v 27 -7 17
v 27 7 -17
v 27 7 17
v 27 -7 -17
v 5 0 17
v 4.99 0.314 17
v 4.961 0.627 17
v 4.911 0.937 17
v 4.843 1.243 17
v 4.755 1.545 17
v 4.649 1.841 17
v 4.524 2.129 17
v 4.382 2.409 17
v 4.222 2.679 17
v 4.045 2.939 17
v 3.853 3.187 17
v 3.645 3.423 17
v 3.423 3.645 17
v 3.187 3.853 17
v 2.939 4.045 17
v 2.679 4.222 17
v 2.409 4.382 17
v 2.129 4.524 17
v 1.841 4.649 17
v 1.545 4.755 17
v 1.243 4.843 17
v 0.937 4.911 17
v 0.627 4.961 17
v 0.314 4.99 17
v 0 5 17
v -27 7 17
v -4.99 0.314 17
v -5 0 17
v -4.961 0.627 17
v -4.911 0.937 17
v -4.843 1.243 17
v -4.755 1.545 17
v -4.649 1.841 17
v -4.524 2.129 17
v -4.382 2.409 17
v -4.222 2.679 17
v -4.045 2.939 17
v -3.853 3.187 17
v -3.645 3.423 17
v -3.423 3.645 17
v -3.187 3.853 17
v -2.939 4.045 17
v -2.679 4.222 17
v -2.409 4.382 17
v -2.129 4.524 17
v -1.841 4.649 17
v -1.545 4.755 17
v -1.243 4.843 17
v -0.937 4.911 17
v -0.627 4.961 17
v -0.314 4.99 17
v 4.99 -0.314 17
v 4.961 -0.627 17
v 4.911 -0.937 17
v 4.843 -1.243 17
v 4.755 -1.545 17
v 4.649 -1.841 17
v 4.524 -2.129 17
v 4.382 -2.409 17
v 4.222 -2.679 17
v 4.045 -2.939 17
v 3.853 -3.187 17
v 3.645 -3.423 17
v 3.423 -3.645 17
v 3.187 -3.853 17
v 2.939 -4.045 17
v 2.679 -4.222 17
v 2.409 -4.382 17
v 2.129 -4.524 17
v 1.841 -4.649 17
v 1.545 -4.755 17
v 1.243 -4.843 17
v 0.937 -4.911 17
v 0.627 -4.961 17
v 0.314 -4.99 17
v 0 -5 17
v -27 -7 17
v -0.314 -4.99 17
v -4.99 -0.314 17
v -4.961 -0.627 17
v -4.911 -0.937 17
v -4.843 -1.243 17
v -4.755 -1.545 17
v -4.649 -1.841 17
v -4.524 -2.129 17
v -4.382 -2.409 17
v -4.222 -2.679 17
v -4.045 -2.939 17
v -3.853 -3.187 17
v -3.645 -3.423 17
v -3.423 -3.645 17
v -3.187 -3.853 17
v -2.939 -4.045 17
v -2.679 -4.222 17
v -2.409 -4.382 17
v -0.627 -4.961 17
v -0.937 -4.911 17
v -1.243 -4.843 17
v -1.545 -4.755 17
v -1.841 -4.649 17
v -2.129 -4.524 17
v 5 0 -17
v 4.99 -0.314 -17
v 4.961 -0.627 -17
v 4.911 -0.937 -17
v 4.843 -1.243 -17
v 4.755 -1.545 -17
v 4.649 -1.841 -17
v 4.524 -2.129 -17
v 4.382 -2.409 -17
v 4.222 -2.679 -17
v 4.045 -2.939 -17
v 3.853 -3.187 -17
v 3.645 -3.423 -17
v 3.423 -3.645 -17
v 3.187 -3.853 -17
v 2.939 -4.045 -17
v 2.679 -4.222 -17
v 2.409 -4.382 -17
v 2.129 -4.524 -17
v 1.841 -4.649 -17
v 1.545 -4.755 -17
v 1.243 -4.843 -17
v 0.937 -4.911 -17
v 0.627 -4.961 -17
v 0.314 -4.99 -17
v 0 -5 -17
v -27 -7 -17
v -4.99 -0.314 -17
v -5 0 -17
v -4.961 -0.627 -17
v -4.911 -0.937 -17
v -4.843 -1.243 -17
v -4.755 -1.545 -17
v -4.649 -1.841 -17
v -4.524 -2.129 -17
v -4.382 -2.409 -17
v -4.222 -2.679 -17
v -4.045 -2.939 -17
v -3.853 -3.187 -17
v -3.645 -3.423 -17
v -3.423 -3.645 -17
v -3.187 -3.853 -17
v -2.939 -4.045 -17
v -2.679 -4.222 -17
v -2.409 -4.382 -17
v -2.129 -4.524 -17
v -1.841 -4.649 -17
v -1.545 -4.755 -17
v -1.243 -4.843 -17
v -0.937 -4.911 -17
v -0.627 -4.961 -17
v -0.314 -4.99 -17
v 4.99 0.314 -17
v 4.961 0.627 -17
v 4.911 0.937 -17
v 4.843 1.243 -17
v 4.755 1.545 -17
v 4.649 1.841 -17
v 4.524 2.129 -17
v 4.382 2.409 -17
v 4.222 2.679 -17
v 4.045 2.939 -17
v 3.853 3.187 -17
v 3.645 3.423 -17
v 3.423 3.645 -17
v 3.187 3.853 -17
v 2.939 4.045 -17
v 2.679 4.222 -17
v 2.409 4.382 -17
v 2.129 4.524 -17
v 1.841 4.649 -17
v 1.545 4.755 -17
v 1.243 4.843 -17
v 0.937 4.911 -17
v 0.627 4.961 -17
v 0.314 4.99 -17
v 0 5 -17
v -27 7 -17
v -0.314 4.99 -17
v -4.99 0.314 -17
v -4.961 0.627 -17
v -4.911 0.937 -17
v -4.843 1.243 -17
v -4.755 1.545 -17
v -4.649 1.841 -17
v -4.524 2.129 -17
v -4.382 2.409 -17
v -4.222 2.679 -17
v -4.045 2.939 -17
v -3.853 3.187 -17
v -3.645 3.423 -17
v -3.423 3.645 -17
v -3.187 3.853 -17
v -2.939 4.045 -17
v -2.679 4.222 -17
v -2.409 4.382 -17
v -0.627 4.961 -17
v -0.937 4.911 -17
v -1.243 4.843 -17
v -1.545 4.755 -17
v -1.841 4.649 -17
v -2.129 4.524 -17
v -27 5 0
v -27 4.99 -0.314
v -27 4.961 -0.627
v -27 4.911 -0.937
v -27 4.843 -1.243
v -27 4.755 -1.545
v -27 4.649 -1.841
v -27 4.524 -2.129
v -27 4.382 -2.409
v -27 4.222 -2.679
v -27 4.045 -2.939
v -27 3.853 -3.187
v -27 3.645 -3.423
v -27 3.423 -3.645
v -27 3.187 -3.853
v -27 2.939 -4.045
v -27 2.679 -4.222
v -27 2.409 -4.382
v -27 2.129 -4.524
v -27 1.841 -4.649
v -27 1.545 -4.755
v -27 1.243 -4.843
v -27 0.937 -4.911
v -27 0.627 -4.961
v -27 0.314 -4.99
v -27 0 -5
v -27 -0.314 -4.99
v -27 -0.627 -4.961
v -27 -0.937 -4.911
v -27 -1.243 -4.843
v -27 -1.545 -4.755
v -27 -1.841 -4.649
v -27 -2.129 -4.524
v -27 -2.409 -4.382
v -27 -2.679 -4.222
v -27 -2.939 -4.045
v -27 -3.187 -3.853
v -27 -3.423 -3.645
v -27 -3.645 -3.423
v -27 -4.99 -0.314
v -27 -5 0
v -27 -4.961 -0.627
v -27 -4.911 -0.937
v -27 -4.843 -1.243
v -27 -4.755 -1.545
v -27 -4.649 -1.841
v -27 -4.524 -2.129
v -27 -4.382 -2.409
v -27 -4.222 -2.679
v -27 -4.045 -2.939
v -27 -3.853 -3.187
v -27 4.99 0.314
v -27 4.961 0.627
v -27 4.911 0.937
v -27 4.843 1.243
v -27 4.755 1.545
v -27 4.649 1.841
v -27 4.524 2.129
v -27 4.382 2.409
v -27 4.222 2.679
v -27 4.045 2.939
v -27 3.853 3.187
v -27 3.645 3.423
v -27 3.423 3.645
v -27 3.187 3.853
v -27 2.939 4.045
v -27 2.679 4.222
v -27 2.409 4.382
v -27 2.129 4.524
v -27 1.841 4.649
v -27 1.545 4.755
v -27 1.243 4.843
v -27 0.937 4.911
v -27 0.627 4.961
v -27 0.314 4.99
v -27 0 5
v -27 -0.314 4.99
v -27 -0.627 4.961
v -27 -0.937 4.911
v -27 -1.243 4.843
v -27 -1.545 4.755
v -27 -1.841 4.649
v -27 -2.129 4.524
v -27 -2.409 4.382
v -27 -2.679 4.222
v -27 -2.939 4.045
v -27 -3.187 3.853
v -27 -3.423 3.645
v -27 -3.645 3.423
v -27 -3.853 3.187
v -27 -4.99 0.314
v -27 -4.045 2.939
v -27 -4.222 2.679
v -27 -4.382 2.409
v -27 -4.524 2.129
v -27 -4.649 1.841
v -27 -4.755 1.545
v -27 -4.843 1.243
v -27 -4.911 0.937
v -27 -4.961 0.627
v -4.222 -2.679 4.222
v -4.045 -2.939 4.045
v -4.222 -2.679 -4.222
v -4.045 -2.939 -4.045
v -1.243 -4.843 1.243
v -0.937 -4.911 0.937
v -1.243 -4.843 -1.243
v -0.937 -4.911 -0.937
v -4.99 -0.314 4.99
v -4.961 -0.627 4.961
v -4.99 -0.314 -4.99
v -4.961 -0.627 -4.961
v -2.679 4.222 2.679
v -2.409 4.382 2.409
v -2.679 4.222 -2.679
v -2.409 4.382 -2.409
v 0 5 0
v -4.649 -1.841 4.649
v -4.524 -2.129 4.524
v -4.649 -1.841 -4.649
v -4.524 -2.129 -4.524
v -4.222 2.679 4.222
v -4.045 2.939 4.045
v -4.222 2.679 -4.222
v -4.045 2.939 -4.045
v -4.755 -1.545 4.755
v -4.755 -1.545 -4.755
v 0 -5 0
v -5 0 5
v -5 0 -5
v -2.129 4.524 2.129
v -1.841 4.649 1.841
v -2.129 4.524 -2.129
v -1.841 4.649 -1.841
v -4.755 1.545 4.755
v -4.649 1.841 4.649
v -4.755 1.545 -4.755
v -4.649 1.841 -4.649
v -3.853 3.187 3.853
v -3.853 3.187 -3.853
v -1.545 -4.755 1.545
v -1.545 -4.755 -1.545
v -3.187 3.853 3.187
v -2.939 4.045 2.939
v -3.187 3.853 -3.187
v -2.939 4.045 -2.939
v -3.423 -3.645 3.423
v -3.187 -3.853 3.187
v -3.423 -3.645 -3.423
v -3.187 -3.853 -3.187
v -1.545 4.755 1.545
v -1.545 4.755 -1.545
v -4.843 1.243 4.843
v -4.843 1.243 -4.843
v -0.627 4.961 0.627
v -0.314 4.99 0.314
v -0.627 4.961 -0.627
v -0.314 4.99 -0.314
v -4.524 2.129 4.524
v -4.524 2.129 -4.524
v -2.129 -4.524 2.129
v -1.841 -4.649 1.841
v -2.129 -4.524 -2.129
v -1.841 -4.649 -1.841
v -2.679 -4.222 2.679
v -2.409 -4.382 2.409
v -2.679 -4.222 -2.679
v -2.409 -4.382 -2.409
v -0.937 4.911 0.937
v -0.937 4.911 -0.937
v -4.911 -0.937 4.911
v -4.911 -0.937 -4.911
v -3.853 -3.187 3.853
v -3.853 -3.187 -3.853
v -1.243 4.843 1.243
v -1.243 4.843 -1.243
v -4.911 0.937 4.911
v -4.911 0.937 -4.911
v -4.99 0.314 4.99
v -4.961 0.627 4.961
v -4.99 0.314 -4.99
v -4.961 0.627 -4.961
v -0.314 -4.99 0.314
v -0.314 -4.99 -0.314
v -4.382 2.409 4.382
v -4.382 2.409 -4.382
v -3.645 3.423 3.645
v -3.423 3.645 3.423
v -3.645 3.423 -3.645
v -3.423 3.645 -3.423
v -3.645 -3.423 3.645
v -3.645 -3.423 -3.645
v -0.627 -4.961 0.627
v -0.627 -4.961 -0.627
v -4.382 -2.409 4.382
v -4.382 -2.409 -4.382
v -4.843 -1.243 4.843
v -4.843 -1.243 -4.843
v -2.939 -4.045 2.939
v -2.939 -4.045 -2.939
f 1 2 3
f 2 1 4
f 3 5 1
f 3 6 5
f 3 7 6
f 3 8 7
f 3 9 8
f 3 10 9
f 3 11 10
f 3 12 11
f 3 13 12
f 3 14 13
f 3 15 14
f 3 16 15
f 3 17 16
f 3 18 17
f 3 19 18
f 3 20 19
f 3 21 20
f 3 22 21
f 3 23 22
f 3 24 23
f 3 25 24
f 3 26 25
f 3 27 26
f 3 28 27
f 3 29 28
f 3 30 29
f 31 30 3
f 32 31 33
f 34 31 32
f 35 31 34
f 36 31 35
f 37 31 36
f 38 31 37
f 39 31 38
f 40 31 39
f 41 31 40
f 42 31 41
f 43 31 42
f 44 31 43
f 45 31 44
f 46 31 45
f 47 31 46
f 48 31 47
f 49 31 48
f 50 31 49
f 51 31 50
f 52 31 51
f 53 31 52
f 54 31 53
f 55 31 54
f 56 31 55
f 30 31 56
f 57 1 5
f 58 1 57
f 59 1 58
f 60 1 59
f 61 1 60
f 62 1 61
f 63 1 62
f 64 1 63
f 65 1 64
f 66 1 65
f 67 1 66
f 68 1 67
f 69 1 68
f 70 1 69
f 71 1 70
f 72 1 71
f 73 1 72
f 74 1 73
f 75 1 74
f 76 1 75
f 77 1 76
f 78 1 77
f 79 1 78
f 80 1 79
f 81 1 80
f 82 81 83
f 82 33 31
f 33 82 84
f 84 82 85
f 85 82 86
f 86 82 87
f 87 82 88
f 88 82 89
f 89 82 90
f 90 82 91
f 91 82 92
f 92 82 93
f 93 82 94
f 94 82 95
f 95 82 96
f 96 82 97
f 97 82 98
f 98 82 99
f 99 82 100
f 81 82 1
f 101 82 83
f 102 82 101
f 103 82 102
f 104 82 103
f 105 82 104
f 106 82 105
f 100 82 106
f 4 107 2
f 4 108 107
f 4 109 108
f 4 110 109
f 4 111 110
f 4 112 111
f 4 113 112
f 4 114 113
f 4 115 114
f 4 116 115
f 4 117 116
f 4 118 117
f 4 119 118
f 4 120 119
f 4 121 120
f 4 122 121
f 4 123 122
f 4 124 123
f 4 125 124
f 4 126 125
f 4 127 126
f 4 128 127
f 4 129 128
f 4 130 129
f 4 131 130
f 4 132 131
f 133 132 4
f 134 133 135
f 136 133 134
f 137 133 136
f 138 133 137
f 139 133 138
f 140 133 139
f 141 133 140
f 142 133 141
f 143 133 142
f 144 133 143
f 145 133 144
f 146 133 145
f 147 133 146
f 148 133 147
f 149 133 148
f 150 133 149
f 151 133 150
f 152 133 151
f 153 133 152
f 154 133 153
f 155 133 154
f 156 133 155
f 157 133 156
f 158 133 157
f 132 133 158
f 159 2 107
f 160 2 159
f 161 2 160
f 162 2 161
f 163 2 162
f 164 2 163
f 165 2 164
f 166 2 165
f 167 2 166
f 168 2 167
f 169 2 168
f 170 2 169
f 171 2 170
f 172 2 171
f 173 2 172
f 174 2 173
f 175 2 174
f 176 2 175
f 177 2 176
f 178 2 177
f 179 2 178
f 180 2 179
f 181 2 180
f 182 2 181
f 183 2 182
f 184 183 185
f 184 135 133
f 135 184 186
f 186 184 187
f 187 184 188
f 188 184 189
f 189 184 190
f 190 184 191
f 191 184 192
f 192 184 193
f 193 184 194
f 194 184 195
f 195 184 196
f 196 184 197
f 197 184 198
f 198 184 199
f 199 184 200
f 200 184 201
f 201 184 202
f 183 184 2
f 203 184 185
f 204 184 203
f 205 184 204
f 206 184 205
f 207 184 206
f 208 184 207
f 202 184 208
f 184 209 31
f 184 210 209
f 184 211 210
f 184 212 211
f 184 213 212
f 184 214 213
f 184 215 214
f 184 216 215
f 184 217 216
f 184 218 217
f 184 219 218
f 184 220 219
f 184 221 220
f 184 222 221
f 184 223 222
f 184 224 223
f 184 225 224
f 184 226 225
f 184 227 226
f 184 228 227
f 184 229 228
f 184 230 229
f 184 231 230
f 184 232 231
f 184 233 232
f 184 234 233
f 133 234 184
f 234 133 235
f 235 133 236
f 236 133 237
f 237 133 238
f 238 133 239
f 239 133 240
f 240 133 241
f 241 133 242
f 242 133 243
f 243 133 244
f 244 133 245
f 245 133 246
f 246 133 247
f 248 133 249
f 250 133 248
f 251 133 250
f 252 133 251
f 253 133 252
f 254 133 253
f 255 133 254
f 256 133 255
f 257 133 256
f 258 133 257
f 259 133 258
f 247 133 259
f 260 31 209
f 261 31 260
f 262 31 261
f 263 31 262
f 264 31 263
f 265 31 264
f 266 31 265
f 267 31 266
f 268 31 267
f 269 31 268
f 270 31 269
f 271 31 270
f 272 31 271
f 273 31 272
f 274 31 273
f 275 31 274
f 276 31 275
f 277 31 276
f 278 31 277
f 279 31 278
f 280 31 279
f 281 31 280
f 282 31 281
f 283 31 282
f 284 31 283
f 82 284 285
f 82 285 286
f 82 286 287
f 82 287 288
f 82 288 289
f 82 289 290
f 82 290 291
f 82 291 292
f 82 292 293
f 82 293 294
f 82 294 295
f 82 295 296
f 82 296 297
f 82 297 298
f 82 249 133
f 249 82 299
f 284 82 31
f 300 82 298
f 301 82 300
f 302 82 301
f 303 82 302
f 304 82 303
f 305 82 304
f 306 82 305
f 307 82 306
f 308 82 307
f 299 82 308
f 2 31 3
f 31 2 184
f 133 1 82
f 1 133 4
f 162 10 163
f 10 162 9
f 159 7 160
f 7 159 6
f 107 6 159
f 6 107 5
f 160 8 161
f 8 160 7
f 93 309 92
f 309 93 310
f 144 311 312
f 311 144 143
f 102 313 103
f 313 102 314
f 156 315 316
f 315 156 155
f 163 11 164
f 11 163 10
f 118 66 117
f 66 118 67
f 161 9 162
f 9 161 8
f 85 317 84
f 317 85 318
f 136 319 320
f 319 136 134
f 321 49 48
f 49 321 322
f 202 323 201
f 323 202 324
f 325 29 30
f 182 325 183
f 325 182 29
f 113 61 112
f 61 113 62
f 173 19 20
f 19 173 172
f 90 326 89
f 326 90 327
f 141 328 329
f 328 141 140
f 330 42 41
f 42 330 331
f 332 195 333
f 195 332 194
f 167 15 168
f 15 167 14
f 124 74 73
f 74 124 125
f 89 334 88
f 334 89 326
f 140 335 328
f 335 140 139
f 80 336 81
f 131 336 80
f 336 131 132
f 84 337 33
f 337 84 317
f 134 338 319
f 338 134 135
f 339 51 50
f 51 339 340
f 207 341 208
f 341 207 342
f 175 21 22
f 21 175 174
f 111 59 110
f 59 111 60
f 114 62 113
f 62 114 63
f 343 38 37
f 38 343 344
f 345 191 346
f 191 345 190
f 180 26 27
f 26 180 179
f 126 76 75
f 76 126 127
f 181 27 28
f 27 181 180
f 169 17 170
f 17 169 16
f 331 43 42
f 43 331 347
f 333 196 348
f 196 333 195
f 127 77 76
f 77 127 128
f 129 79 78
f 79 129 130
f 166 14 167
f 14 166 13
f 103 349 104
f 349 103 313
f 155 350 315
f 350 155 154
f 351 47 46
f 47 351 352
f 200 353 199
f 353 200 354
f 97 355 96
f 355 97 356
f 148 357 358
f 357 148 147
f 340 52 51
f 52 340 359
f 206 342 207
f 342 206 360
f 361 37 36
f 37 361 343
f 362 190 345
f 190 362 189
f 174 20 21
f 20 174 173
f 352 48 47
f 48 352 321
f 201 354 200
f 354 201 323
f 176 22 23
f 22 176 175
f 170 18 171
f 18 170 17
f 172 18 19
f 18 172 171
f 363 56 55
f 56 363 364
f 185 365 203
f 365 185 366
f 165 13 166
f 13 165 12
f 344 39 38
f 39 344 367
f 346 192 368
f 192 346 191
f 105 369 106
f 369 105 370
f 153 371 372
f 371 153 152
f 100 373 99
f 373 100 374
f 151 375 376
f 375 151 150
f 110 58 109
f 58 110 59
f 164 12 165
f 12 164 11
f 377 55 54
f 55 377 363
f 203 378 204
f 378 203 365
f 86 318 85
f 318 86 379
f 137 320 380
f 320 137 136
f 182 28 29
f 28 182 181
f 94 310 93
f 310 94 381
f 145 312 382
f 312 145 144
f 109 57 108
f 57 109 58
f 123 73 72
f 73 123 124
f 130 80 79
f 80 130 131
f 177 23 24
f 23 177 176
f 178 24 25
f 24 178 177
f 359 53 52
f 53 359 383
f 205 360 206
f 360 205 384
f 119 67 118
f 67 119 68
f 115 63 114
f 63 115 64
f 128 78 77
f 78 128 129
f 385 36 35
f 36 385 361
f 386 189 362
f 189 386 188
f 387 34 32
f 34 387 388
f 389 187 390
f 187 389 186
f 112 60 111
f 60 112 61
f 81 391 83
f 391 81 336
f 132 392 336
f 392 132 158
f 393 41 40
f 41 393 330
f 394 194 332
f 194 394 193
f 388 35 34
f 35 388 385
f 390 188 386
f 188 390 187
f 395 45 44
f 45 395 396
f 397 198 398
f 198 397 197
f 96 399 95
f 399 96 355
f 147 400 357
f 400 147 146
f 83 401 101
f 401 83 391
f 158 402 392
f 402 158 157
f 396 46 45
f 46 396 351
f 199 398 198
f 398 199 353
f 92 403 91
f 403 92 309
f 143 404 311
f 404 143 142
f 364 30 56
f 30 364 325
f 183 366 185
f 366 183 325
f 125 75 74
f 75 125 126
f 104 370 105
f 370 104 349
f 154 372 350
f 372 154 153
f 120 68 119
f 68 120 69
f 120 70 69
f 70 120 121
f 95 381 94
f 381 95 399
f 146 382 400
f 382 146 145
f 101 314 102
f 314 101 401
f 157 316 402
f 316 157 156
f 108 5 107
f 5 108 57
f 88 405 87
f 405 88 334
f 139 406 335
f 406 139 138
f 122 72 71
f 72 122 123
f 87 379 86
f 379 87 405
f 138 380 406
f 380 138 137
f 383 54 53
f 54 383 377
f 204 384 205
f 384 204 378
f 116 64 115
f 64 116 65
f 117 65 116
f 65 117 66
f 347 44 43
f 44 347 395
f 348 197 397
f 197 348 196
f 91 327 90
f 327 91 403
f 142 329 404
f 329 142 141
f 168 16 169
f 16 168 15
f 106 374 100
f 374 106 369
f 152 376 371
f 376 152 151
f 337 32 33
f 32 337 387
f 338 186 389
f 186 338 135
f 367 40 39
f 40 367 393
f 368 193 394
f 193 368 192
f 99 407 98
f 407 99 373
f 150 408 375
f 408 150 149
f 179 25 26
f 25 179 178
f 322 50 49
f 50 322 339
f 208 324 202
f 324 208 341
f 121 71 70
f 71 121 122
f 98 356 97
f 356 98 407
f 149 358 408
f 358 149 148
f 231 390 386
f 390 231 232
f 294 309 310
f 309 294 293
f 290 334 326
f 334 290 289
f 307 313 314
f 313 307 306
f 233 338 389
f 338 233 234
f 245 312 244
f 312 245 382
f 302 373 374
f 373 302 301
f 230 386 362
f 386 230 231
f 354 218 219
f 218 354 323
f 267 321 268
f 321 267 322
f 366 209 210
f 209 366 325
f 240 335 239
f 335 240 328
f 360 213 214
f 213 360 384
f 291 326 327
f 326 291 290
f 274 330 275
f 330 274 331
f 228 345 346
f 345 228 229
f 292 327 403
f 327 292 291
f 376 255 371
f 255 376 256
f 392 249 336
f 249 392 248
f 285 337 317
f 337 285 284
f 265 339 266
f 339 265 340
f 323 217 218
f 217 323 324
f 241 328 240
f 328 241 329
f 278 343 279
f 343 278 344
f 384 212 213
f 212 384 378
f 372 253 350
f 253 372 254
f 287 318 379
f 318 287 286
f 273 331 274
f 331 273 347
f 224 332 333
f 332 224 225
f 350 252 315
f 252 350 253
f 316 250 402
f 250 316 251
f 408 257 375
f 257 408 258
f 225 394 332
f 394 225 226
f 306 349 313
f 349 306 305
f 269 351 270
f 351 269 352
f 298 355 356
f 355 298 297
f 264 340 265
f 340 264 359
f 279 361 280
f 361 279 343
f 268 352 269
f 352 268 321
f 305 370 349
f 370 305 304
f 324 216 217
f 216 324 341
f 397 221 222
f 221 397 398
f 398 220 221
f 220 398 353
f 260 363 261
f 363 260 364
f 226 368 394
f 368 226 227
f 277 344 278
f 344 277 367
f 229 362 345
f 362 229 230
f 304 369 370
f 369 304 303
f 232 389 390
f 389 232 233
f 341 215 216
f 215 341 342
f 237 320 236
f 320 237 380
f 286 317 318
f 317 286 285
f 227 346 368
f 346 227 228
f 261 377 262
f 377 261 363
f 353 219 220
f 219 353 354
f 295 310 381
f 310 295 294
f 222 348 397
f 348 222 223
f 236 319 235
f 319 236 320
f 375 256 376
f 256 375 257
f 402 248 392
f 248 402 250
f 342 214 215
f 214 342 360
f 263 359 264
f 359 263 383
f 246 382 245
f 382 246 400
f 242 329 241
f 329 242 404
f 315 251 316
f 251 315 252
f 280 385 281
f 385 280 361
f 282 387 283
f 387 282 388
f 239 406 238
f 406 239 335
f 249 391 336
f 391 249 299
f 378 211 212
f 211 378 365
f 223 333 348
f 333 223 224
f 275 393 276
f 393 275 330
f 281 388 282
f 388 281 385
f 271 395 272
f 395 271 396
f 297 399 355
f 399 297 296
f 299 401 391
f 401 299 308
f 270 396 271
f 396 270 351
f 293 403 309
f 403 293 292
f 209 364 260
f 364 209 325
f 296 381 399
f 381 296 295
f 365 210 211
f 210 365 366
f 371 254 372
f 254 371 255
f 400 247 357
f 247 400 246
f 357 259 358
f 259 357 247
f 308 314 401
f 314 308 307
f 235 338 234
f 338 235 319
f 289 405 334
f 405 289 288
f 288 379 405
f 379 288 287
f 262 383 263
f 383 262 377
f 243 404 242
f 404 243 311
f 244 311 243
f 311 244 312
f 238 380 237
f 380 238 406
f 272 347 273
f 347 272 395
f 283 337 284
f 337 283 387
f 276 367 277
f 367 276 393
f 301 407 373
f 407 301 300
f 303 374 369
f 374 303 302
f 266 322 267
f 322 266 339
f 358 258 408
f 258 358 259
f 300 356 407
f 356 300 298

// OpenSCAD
/* 
	Supplemental T-Junction 7

*/

$fn = 100;  // Increase the resolution of the cylinders
pipe_radius = 5;
pipe_length = 50;

// Define the cube dimensions
cube_size = [pipe_length + 4, 2*pipe_radius + 4, pipe_length/2 + pipe_radius + 4];

difference() {
    // Create the cube
    translate([0, 0, 0])
    cube(cube_size, center=true);

    // Subtract the x-axis pipe
    translate([0, 0, 0])
    cylinder(h=pipe_length, r=pipe_radius, center=true);

    // Subtract the y-axis pipe
    rotate([0, 90, 0])
    translate([0, 0, -pipe_length/2])
    cylinder(h=pipe_length, r=pipe_radius, center=true);
}
